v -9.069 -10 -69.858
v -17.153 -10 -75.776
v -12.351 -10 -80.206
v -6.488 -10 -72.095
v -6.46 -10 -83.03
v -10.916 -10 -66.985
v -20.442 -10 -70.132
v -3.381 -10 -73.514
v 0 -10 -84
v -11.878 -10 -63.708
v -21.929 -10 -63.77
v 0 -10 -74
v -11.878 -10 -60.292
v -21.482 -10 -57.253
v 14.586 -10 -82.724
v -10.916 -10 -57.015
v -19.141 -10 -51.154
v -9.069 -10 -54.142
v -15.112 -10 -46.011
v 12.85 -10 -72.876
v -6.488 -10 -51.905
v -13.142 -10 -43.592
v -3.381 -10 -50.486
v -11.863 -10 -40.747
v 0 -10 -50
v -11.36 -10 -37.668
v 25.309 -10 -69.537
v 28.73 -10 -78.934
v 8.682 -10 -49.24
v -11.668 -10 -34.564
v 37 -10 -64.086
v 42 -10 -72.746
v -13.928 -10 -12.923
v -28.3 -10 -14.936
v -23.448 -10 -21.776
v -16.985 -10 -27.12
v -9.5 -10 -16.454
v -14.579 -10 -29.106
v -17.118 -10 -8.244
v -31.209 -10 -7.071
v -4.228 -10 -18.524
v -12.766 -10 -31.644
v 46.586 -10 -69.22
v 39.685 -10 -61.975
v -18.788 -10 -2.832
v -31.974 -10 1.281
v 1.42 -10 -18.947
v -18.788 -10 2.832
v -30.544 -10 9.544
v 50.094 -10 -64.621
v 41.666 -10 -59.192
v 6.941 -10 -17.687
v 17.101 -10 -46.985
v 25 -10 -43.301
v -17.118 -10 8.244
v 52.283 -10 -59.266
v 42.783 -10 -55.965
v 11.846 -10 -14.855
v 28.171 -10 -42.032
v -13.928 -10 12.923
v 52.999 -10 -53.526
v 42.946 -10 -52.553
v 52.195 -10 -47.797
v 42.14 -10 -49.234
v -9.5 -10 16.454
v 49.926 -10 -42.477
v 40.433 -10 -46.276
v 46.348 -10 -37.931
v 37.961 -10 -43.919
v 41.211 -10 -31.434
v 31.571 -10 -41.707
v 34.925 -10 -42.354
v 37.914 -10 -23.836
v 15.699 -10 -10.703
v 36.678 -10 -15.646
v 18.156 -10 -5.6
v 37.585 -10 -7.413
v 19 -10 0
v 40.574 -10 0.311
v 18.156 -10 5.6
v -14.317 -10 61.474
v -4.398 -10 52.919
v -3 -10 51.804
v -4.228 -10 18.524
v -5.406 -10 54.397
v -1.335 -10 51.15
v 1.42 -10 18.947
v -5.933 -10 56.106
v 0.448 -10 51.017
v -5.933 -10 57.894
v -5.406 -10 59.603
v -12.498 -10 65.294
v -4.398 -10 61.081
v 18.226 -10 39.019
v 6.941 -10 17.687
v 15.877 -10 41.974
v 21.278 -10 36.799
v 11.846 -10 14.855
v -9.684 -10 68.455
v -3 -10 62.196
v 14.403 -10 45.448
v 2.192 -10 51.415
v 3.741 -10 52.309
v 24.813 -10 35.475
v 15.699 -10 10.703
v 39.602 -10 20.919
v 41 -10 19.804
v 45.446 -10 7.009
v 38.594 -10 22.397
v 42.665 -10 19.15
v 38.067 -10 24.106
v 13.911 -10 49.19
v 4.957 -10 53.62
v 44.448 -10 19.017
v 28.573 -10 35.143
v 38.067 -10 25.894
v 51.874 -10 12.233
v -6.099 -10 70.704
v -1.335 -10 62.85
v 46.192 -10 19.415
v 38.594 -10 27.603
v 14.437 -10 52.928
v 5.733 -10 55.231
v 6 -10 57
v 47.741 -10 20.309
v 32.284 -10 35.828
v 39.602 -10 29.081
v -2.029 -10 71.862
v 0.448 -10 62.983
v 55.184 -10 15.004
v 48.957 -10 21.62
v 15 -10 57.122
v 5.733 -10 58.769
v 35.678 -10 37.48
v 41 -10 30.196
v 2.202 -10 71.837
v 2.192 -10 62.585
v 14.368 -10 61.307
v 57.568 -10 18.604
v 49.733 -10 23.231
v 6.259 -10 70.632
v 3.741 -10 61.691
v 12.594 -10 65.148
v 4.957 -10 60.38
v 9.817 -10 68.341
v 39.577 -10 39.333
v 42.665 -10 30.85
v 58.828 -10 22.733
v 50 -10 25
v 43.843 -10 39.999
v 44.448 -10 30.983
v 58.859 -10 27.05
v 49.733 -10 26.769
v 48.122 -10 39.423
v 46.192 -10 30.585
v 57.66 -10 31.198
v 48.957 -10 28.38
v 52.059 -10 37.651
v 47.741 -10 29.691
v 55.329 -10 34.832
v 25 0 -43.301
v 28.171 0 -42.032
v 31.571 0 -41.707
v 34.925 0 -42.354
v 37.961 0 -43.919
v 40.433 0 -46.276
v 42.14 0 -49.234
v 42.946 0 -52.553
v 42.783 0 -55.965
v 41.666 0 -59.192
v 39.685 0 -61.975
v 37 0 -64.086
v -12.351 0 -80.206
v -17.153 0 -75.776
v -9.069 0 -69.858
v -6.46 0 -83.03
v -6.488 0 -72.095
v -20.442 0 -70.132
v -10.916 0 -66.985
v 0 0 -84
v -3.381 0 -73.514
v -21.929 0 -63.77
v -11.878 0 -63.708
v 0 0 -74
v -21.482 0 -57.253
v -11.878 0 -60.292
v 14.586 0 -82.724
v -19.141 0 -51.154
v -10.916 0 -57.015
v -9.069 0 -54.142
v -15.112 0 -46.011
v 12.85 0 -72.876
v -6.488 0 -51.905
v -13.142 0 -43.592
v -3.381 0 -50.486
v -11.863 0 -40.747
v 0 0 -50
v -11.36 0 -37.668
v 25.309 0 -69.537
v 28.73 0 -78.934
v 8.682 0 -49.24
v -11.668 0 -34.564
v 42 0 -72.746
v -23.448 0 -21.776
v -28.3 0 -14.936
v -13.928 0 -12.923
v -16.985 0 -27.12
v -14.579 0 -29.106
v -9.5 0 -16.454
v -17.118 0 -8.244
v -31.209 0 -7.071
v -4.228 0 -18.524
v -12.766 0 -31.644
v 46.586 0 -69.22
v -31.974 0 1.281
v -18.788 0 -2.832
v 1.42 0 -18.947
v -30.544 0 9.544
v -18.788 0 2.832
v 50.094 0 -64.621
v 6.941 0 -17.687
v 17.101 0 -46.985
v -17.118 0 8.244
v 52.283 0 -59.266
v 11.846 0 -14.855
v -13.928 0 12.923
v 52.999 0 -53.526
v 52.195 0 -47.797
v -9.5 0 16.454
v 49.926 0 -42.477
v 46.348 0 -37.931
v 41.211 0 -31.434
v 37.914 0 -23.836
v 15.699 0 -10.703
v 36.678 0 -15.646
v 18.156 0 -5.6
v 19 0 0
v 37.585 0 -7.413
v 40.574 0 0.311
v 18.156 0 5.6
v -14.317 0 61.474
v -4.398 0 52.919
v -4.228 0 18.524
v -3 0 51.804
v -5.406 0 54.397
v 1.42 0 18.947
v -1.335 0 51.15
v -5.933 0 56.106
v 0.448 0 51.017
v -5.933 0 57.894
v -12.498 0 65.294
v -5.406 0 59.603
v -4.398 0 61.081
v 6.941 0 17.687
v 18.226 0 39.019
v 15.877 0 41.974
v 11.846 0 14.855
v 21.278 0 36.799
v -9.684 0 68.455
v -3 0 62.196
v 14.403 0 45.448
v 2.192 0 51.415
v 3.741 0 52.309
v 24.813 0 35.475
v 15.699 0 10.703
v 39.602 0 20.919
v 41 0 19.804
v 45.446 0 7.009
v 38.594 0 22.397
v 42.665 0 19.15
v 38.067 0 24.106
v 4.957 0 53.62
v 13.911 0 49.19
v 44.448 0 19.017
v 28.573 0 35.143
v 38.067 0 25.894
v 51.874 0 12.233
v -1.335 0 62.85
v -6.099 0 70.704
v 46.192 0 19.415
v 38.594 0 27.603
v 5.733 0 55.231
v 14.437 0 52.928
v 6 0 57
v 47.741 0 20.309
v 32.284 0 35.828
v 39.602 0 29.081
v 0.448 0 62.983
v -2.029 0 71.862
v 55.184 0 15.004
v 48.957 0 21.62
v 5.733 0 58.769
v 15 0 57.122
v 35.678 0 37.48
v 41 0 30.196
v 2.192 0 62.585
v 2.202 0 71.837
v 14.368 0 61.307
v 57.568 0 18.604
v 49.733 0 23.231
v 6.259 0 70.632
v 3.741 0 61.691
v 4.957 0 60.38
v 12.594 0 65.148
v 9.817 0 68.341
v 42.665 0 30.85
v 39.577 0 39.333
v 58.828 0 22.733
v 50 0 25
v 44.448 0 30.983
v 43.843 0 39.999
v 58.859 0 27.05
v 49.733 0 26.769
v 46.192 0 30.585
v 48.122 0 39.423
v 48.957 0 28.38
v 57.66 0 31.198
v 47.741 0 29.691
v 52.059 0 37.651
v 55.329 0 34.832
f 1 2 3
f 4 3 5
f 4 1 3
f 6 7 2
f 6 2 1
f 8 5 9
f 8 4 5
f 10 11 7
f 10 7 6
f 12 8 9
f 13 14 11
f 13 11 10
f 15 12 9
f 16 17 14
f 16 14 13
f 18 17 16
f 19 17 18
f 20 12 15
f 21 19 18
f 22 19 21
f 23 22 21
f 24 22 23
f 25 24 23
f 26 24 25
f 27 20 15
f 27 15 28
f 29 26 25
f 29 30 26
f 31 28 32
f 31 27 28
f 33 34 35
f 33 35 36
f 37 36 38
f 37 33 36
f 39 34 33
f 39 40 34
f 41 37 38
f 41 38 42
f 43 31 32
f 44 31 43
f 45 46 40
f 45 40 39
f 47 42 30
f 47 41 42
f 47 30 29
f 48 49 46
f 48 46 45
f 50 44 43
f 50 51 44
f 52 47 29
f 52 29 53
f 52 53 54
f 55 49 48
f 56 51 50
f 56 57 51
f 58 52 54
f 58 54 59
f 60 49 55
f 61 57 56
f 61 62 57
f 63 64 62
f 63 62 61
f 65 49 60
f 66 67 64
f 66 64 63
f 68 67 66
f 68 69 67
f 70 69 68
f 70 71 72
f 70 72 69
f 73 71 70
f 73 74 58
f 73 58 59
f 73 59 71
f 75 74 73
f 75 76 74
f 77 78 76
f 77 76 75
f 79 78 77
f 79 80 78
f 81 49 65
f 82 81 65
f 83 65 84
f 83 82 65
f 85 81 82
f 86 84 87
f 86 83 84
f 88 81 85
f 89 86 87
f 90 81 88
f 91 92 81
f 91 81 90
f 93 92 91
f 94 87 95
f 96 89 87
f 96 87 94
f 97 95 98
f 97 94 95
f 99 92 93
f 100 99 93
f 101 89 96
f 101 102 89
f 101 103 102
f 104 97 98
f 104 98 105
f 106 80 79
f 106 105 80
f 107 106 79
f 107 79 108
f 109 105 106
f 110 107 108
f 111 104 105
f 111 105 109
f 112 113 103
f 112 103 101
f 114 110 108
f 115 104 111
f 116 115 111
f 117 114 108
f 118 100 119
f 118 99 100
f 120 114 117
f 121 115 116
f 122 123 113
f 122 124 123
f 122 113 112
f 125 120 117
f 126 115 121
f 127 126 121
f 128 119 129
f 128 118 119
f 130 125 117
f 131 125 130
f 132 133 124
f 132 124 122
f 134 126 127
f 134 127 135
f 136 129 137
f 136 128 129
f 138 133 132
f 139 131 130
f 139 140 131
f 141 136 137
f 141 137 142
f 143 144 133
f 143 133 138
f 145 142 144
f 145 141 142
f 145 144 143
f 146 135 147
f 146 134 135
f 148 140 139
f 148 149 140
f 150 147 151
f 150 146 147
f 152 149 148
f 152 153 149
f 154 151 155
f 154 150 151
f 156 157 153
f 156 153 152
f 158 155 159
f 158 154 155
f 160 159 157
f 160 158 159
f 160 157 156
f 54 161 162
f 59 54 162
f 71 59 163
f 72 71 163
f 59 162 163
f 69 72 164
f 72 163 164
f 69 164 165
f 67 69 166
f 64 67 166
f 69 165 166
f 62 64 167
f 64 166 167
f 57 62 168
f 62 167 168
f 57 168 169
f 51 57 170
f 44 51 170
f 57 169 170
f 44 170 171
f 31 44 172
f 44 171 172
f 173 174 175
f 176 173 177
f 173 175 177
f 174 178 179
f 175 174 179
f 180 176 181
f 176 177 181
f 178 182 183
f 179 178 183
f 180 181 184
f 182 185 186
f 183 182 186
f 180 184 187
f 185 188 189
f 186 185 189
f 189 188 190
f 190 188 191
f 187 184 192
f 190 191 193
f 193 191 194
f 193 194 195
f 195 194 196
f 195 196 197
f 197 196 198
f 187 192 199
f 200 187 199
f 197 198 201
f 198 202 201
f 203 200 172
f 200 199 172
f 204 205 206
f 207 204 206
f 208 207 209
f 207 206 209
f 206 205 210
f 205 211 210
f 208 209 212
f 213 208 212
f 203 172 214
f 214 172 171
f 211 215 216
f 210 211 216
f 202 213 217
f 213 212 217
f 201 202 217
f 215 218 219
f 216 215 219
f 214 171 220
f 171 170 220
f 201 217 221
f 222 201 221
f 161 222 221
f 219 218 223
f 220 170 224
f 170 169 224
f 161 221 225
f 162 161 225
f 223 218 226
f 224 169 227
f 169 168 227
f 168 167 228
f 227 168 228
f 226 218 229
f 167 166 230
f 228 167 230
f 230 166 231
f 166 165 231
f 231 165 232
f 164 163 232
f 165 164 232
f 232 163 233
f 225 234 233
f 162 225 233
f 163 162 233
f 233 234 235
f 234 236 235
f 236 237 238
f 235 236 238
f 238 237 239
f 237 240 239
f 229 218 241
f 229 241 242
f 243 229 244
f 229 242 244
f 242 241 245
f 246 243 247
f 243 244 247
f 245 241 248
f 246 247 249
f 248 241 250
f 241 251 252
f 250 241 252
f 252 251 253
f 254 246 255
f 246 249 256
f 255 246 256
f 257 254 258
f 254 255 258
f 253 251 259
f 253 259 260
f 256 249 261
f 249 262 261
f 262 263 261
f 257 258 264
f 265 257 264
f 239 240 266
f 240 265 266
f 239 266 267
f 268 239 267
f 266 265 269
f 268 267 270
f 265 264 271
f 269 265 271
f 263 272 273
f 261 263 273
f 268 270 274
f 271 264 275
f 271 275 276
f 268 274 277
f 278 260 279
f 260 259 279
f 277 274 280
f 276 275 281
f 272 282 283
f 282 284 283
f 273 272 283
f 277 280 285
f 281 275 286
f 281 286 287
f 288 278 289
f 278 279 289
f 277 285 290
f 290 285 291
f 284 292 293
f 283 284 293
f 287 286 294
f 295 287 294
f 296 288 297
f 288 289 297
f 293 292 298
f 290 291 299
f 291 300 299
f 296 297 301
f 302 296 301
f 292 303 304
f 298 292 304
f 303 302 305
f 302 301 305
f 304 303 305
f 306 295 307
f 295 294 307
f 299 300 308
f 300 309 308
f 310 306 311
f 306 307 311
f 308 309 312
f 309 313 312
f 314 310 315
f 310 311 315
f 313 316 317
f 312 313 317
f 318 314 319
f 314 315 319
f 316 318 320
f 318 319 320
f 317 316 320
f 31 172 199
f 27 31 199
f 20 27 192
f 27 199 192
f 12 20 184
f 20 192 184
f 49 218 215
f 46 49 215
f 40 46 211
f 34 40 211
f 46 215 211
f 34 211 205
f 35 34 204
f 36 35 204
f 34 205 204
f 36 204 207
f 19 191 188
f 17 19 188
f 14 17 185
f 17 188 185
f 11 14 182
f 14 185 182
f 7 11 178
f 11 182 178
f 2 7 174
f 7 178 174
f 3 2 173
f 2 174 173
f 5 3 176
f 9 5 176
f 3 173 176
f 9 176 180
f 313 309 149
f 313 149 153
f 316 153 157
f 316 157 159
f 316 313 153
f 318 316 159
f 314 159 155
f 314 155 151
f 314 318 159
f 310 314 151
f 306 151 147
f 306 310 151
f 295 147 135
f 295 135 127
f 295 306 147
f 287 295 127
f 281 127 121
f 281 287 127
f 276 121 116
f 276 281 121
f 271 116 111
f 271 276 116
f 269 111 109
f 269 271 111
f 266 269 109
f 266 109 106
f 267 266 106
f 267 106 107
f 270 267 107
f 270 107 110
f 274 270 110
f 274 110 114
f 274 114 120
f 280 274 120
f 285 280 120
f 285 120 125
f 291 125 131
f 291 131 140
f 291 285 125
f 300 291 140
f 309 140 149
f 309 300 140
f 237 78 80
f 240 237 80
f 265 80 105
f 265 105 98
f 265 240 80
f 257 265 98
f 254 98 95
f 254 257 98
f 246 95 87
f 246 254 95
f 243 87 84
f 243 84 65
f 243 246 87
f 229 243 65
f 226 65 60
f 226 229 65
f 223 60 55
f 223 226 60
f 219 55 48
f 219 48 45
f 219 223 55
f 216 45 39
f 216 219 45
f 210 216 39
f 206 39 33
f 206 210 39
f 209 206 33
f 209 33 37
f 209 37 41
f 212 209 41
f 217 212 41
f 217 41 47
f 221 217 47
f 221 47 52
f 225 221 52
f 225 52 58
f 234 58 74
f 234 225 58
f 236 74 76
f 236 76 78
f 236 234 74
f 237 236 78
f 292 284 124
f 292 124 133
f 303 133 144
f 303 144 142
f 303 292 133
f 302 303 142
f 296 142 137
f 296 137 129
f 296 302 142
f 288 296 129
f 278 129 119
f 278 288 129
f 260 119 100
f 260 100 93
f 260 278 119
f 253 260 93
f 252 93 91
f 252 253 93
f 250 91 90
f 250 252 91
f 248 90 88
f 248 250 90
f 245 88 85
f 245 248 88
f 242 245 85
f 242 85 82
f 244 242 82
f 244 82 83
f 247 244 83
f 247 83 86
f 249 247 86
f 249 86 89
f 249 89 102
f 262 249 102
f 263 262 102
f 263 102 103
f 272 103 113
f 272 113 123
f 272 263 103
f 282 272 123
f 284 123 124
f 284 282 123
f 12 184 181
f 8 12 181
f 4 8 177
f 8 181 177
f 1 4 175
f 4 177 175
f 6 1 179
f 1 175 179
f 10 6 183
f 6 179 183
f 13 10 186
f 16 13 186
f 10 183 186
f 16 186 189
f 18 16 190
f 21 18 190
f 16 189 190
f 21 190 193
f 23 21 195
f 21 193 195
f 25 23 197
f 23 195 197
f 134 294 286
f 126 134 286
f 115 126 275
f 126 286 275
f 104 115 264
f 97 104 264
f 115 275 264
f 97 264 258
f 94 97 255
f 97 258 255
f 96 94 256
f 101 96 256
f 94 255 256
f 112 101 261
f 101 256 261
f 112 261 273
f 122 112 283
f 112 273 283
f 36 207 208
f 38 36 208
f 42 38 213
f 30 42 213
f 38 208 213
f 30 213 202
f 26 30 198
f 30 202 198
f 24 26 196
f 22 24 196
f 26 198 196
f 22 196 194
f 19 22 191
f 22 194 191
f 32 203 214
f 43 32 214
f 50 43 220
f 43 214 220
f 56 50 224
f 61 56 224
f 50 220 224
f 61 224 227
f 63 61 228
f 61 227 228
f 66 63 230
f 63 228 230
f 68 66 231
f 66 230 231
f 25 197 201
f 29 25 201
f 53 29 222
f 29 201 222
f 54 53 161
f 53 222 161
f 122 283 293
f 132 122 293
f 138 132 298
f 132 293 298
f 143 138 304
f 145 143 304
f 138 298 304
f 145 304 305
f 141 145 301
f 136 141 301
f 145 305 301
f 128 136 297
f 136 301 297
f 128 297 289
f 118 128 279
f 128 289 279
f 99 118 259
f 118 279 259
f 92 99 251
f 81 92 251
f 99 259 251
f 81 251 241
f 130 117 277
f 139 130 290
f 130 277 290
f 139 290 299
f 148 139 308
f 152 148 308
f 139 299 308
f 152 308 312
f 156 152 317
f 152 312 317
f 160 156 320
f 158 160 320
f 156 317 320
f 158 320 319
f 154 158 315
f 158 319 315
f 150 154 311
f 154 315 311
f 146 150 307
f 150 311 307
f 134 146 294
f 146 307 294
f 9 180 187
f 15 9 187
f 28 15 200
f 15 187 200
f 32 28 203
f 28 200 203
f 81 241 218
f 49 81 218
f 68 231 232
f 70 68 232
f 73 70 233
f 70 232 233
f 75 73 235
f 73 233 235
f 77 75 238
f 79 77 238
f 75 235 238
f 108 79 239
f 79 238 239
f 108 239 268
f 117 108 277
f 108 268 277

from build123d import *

# Parameters (mm, degrees)
F0_R     = 19
F0_R_2   = 6
F1_DEPTH = 10


with BuildPart() as f1:
    # F0 (on Front) → F1 (new body)
    with BuildSketch(Plane.XZ):
        with BuildLine():
            ThreePointArc((35.678131, 37.479843), (19.676649, 37.805392), (14.436751, 52.928119))
            ThreePointArc((14.436751, 52.928119), (4.2732, 71.378448), (-14.317337, 61.473684))
            Line((-14.317337, 61.473684), (-30.543653, 9.54386))
            ThreePointArc((-30.543653, 9.54386), (-30.013481, -11.099143), (-16.985078, -27.120235))
            ThreePointArc((-16.985078, -27.120235), (-11.413054, -36.106142), (-15.111724, -46.011385))
            ThreePointArc((-15.111724, -46.011385), (-20.441985, -70.131743), (0, -84))
            ThreePointArc((0, -84), (21.7408, -81.137769), (42, -72.746134))
            ThreePointArc((42, -72.746134), (52.830446, -56.419677), (46.347556, -37.931198))
            ThreePointArc((46.347556, -37.931198), (36.8637, -11.500057), (51.87381, 12.232733))
            ThreePointArc((51.87381, 12.232733), (56.625543, 33.099115), (35.678131, 37.479843))
        make_face()
        with BuildLine():
            ThreePointArc((0, -74), (-12, -62), (0, -50))
            ThreePointArc((0, -50), (12.940952, -48.296291), (25, -43.30127))
            ThreePointArc((25, -43.30127), (41.392305, -47.693575), (37, -64.08588))
            ThreePointArc((37, -64.08588), (19.152609, -71.478511), (0, -74))
        make_face(mode=Mode.SUBTRACT)
        Circle(F0_R, mode=Mode.SUBTRACT)
        with Locations((0, 57)):
            Circle(F0_R_2, mode=Mode.SUBTRACT)
        with Locations((44, 25)):
            Circle(F0_R_2, mode=Mode.SUBTRACT)
    extrude(amount=F1_DEPTH)


solid = f1.part
